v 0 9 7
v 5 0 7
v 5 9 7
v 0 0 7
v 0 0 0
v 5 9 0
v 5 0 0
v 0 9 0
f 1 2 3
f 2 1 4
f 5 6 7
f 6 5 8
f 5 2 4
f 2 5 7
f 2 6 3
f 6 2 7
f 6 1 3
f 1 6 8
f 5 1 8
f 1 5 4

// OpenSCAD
// Generated by SolidPython 1.0.1 on 2020-07-29 00:46:54


cube(size = [5, 9, 7]);
/***********************************************
*********      SolidPython code:      **********
************************************************
 
# import packages: SolidPython
from solid import *
from solid.utils import *
from itertools import chain, combinations, permutations


class Resize:

    def __init__(self, scad_file):
        self.scad_file = scad_file
        #self.scad_file = import_scad(scad_file)
        # cone/cylinder param:
        self.r1 = 0
        self.r2 = 0
        self.h = 0
        # rectangular prism param:
        self.w = 0
        self.l = 0
        # ellipse param:
        self.r = 0

    # import OpenScad code (file name corresponds to shape)


    # classify shape + parameters
    def assign(self, param1, param2, param3):
        if self.scad_file == 'cone.scad':
            self.r1 = param1
            self.r2 = param2
            self.h = param3
        elif self.scad_file == 'cylinder.scad':
            self.r1 = param1
            self.r2 = param2
            self.h = param3
        elif self.scad_file == 'rectangularPrism.scad':
            self.h = param1
            self.l = param2
            self.w = param3
        else:
            self.r = param1
            self.h = param2

    # resize parameters
    def iterate(self):
        x = range(3, 20, 2)
        i = 1
        if self.scad_file == 'cone.scad':
            tempList = list(permutations(x, 2))
            for temp in tempList:
                param1 = temp[0]
                param2 = temp[1]
                filepath = 'produced_scad_files/' + 'cone' + str(param1) + '_' + str(param2) + '_' + '.scad'
                scad_render_to_file(cylinder(h=param1, r1=param2, r2=0), filepath)

        elif self.scad_file == 'cylinder.scad':
            tempList = list(permutations(x, 3))
            for temp in tempList:
                param1 = temp[0]
                param2 = temp[1]
                filepath = 'produced_scad_files/' + 'cylinder' + str(param1) + '_' + str(param2) + '_' + '.scad'
                scad_render_to_file(cylinder(h=param1, r1=param2, r2=param2), filepath)

        elif self.scad_file == 'rectangularPrism.scad':
            tempList = list(permutations(x, 3))
            for temp in tempList:
                param1 = temp[0]
                param2 = temp[1]
                param3 = temp[2]
                filepath = 'produced_scad_files/' + 'rectangularPrism' + str(param1) + '_' + str(param2) + '_' + str(
                    param3) + '.scad'
                scad_render_to_file(cube(size=(param1, param2, param3)), filepath)

        elif self.scad_file == 'ellipse.scad':
            tempList = list(permutations(x, 4))
            for temp in tempList:
                param1 = temp[0]
                param2 = temp[1]
                param3 = temp[2]
                param4 = temp[3]
                filepath = 'produced_scad_files/' + 'ellipse' + str(param1) + '_' + str(param2) + '_' + str(param3) + '_' + str(param4) + '.scad'
                scad_render_to_file(scale([param1, param2, param3])(sphere(r=param4)), filepath)

    def render_to_scadfile(self):
        scad_render_to_file(scad, 'example.scad') 
 
************************************************/
